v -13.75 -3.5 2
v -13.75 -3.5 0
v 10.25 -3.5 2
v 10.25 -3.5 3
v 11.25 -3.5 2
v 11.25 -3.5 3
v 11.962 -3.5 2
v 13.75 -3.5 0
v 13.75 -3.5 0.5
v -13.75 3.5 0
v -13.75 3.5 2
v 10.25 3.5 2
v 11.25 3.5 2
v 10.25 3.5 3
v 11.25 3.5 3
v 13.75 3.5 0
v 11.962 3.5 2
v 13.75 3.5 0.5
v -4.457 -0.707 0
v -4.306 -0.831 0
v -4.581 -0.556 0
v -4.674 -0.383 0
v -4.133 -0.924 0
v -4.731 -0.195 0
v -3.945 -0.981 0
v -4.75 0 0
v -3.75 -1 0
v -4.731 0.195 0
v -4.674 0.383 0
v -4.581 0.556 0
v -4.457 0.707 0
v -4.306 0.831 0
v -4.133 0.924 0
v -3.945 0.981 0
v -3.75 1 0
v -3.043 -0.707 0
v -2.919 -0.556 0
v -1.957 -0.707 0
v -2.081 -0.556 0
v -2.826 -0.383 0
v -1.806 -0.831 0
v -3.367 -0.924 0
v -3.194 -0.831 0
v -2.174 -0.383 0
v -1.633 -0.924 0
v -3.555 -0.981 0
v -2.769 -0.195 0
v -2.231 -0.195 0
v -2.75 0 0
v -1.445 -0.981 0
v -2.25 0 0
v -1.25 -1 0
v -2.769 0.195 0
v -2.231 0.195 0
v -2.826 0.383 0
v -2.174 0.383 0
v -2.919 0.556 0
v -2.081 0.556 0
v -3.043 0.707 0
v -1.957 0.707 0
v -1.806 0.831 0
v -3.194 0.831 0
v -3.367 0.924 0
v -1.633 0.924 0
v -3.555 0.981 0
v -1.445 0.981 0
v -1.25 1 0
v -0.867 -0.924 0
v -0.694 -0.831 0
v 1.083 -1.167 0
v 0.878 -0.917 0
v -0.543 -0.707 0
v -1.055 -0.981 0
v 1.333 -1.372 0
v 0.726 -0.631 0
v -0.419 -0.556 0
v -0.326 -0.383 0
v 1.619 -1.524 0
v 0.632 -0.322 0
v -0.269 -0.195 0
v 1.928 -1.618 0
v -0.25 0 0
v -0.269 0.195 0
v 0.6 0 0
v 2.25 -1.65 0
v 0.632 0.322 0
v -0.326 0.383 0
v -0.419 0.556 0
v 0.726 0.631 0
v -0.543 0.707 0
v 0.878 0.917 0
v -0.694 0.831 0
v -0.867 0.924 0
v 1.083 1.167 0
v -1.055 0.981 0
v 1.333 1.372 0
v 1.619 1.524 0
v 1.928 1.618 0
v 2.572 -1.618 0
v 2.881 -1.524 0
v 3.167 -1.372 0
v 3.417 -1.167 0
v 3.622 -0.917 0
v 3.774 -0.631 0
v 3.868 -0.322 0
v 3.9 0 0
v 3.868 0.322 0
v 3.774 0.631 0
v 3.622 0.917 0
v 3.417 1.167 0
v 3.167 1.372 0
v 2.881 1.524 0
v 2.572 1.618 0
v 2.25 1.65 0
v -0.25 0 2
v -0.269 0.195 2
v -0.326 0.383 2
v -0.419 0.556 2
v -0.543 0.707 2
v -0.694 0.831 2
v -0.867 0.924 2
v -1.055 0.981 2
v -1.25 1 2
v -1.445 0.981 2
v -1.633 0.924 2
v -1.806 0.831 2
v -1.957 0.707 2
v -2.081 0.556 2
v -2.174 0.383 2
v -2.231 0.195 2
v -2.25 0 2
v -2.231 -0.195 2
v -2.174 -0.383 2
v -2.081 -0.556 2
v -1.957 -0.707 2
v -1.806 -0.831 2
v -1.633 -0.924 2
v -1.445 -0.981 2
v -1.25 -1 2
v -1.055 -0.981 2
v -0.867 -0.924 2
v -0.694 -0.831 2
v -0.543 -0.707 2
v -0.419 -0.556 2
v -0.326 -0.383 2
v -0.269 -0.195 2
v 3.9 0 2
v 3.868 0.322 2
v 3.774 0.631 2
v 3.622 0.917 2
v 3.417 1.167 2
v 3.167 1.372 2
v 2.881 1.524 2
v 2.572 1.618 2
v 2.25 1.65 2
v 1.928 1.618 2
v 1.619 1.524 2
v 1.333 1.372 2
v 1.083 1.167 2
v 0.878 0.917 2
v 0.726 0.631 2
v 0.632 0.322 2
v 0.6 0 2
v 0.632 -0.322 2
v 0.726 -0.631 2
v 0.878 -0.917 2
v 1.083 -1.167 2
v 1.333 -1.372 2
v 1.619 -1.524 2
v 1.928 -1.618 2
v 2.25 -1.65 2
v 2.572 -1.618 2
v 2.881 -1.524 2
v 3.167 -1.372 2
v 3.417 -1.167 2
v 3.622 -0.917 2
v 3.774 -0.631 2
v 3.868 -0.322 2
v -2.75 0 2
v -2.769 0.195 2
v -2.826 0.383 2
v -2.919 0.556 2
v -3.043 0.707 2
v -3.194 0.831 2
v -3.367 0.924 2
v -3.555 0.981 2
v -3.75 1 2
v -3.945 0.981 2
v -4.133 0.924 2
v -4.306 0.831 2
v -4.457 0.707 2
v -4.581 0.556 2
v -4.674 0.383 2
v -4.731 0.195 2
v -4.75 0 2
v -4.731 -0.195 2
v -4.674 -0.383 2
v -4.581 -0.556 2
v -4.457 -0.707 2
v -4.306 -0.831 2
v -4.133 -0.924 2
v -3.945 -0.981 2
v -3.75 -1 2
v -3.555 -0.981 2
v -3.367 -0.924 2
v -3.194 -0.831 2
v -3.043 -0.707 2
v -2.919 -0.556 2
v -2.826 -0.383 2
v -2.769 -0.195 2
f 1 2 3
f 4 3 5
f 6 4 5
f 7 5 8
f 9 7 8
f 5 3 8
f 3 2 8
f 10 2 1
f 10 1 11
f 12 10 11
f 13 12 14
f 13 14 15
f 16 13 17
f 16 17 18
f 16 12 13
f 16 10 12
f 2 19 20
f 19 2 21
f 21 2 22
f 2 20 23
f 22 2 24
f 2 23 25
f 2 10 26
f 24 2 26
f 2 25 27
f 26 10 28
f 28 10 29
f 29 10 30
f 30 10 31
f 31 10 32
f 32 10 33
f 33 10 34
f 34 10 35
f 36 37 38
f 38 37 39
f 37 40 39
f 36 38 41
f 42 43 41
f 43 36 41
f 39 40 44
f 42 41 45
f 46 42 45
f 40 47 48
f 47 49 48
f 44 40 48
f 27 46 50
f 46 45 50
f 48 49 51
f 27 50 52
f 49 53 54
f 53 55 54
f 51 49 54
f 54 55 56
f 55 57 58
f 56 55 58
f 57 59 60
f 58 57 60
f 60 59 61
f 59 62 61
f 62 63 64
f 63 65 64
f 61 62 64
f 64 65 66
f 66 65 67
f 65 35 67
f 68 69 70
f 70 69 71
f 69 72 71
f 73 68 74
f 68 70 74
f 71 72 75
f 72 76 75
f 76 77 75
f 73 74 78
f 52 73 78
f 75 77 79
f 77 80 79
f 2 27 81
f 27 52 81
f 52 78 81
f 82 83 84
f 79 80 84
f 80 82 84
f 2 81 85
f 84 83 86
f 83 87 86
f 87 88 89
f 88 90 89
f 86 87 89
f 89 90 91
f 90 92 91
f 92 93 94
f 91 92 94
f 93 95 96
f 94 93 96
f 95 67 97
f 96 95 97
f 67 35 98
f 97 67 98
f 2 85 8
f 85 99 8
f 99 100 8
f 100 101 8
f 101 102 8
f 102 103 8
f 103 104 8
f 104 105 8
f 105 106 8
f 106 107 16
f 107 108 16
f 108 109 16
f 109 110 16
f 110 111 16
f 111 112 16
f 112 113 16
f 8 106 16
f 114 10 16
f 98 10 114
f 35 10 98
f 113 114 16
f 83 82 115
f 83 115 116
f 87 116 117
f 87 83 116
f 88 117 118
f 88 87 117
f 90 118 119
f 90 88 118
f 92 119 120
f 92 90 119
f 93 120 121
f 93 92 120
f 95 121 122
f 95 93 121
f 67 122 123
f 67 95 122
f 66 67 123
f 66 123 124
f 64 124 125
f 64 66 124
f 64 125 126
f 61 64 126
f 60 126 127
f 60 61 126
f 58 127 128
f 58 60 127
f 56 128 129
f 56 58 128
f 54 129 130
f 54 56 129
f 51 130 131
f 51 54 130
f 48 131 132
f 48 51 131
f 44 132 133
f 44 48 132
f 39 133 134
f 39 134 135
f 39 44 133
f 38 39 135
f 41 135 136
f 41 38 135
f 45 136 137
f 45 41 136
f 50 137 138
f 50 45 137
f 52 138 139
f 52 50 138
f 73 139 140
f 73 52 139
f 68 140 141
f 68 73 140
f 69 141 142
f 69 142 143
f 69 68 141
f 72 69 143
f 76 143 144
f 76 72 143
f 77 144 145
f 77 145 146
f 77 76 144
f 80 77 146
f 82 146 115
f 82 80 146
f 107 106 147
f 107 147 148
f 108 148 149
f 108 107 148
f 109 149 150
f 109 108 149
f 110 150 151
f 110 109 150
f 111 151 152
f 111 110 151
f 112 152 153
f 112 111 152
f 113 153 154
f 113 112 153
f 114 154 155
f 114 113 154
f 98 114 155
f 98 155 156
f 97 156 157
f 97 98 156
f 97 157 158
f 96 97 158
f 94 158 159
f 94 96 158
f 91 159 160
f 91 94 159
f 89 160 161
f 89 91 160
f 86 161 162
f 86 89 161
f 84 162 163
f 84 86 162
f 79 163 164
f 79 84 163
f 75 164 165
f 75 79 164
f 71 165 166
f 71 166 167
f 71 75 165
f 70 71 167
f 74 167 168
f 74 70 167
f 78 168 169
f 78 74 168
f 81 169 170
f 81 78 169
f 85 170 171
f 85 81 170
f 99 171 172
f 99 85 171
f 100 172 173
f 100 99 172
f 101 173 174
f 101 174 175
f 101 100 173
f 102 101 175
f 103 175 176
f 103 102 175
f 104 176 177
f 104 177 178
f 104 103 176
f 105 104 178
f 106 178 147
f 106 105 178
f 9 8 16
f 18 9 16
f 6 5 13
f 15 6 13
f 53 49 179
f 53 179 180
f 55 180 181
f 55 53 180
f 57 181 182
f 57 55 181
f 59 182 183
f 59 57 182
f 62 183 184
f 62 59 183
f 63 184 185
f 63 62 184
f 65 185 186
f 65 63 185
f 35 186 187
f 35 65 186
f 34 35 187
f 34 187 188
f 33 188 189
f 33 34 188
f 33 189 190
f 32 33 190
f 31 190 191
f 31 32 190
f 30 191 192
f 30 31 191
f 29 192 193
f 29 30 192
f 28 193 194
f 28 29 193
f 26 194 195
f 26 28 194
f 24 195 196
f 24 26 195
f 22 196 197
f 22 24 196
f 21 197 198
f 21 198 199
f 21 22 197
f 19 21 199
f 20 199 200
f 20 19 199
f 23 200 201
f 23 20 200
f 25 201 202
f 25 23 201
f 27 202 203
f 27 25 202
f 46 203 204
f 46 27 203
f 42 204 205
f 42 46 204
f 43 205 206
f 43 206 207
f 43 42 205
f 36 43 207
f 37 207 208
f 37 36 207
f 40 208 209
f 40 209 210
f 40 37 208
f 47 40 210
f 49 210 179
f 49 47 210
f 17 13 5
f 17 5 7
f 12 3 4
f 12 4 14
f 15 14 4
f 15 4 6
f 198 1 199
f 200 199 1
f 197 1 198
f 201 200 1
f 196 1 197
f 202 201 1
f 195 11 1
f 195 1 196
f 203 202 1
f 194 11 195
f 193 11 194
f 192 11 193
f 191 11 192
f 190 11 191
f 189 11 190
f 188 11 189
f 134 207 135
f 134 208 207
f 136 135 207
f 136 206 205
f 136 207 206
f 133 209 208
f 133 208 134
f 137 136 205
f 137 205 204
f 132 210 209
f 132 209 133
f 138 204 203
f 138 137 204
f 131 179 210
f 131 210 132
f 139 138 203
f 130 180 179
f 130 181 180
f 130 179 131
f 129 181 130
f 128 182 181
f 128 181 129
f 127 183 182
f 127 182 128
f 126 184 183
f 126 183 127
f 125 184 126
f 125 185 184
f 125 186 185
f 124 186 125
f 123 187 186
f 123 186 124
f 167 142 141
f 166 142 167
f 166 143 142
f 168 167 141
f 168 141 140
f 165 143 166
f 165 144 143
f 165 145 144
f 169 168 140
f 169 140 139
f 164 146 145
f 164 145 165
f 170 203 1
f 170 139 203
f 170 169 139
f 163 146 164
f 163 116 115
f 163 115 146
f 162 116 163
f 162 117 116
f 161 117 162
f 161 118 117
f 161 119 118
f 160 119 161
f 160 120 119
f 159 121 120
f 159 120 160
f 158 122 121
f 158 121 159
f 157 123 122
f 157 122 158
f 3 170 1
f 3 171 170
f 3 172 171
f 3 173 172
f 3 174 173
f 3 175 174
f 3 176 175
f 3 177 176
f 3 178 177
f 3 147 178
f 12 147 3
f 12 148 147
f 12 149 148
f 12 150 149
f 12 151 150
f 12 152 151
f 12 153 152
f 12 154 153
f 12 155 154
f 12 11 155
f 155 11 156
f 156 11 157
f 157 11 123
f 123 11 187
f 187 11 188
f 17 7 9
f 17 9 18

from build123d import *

# Parameters (mm, degrees)
ESBO_O1_W                = 27.5
ESBO_O1_H                = 7
ESBO_O1_R                = 1.65
ESBO_O1_R_2              = 1
RESSALTO_EXTRUS_O1_DEPTH = 2
CHANFRO1_SIZE            = 1.5
CHANFRO1_SIZE2           = 1.787630389
ESBO_O2_W                = 1
ESBO_O2_H                = 7
RESSALTO_EXTRUS_O2_DEPTH = 1


with BuildPart() as part:
    # Esboço1 → Ressalto-extrusão1 (new body)
    with BuildSketch(Plane.XY):
        Rectangle(ESBO_O1_W, ESBO_O1_H)
        with Locations((2.25, 0)):
            Circle(ESBO_O1_R, mode=Mode.SUBTRACT)
        with Locations((-1.25, 0)):
            Circle(ESBO_O1_R_2, mode=Mode.SUBTRACT)
        with Locations((-3.75, 0)):
            Circle(ESBO_O1_R_2, mode=Mode.SUBTRACT)
    extrude(amount=RESSALTO_EXTRUS_O1_DEPTH)

    # Chanfro1
    chanfro1_edges = [part.edges().sort_by_distance(p)[0] for p in [
        (13.75, 0, 2),
    ]]
    chanfro1_side = [part.faces().sort_by_distance(p)[0] for p in [
        (13.75, 0, 1),
    ]]
    chamfer(chanfro1_edges, length=CHANFRO1_SIZE, length2=CHANFRO1_SIZE2, reference=chanfro1_side[0])

    # Esboço2 → Ressalto-extrusão2 (add)
    with BuildSketch(Plane.XY.offset(2)):
        with Locations((10.75, 0)):
            Rectangle(ESBO_O2_W, ESBO_O2_H)
    extrude(amount=RESSALTO_EXTRUS_O2_DEPTH)


solid = part.part
